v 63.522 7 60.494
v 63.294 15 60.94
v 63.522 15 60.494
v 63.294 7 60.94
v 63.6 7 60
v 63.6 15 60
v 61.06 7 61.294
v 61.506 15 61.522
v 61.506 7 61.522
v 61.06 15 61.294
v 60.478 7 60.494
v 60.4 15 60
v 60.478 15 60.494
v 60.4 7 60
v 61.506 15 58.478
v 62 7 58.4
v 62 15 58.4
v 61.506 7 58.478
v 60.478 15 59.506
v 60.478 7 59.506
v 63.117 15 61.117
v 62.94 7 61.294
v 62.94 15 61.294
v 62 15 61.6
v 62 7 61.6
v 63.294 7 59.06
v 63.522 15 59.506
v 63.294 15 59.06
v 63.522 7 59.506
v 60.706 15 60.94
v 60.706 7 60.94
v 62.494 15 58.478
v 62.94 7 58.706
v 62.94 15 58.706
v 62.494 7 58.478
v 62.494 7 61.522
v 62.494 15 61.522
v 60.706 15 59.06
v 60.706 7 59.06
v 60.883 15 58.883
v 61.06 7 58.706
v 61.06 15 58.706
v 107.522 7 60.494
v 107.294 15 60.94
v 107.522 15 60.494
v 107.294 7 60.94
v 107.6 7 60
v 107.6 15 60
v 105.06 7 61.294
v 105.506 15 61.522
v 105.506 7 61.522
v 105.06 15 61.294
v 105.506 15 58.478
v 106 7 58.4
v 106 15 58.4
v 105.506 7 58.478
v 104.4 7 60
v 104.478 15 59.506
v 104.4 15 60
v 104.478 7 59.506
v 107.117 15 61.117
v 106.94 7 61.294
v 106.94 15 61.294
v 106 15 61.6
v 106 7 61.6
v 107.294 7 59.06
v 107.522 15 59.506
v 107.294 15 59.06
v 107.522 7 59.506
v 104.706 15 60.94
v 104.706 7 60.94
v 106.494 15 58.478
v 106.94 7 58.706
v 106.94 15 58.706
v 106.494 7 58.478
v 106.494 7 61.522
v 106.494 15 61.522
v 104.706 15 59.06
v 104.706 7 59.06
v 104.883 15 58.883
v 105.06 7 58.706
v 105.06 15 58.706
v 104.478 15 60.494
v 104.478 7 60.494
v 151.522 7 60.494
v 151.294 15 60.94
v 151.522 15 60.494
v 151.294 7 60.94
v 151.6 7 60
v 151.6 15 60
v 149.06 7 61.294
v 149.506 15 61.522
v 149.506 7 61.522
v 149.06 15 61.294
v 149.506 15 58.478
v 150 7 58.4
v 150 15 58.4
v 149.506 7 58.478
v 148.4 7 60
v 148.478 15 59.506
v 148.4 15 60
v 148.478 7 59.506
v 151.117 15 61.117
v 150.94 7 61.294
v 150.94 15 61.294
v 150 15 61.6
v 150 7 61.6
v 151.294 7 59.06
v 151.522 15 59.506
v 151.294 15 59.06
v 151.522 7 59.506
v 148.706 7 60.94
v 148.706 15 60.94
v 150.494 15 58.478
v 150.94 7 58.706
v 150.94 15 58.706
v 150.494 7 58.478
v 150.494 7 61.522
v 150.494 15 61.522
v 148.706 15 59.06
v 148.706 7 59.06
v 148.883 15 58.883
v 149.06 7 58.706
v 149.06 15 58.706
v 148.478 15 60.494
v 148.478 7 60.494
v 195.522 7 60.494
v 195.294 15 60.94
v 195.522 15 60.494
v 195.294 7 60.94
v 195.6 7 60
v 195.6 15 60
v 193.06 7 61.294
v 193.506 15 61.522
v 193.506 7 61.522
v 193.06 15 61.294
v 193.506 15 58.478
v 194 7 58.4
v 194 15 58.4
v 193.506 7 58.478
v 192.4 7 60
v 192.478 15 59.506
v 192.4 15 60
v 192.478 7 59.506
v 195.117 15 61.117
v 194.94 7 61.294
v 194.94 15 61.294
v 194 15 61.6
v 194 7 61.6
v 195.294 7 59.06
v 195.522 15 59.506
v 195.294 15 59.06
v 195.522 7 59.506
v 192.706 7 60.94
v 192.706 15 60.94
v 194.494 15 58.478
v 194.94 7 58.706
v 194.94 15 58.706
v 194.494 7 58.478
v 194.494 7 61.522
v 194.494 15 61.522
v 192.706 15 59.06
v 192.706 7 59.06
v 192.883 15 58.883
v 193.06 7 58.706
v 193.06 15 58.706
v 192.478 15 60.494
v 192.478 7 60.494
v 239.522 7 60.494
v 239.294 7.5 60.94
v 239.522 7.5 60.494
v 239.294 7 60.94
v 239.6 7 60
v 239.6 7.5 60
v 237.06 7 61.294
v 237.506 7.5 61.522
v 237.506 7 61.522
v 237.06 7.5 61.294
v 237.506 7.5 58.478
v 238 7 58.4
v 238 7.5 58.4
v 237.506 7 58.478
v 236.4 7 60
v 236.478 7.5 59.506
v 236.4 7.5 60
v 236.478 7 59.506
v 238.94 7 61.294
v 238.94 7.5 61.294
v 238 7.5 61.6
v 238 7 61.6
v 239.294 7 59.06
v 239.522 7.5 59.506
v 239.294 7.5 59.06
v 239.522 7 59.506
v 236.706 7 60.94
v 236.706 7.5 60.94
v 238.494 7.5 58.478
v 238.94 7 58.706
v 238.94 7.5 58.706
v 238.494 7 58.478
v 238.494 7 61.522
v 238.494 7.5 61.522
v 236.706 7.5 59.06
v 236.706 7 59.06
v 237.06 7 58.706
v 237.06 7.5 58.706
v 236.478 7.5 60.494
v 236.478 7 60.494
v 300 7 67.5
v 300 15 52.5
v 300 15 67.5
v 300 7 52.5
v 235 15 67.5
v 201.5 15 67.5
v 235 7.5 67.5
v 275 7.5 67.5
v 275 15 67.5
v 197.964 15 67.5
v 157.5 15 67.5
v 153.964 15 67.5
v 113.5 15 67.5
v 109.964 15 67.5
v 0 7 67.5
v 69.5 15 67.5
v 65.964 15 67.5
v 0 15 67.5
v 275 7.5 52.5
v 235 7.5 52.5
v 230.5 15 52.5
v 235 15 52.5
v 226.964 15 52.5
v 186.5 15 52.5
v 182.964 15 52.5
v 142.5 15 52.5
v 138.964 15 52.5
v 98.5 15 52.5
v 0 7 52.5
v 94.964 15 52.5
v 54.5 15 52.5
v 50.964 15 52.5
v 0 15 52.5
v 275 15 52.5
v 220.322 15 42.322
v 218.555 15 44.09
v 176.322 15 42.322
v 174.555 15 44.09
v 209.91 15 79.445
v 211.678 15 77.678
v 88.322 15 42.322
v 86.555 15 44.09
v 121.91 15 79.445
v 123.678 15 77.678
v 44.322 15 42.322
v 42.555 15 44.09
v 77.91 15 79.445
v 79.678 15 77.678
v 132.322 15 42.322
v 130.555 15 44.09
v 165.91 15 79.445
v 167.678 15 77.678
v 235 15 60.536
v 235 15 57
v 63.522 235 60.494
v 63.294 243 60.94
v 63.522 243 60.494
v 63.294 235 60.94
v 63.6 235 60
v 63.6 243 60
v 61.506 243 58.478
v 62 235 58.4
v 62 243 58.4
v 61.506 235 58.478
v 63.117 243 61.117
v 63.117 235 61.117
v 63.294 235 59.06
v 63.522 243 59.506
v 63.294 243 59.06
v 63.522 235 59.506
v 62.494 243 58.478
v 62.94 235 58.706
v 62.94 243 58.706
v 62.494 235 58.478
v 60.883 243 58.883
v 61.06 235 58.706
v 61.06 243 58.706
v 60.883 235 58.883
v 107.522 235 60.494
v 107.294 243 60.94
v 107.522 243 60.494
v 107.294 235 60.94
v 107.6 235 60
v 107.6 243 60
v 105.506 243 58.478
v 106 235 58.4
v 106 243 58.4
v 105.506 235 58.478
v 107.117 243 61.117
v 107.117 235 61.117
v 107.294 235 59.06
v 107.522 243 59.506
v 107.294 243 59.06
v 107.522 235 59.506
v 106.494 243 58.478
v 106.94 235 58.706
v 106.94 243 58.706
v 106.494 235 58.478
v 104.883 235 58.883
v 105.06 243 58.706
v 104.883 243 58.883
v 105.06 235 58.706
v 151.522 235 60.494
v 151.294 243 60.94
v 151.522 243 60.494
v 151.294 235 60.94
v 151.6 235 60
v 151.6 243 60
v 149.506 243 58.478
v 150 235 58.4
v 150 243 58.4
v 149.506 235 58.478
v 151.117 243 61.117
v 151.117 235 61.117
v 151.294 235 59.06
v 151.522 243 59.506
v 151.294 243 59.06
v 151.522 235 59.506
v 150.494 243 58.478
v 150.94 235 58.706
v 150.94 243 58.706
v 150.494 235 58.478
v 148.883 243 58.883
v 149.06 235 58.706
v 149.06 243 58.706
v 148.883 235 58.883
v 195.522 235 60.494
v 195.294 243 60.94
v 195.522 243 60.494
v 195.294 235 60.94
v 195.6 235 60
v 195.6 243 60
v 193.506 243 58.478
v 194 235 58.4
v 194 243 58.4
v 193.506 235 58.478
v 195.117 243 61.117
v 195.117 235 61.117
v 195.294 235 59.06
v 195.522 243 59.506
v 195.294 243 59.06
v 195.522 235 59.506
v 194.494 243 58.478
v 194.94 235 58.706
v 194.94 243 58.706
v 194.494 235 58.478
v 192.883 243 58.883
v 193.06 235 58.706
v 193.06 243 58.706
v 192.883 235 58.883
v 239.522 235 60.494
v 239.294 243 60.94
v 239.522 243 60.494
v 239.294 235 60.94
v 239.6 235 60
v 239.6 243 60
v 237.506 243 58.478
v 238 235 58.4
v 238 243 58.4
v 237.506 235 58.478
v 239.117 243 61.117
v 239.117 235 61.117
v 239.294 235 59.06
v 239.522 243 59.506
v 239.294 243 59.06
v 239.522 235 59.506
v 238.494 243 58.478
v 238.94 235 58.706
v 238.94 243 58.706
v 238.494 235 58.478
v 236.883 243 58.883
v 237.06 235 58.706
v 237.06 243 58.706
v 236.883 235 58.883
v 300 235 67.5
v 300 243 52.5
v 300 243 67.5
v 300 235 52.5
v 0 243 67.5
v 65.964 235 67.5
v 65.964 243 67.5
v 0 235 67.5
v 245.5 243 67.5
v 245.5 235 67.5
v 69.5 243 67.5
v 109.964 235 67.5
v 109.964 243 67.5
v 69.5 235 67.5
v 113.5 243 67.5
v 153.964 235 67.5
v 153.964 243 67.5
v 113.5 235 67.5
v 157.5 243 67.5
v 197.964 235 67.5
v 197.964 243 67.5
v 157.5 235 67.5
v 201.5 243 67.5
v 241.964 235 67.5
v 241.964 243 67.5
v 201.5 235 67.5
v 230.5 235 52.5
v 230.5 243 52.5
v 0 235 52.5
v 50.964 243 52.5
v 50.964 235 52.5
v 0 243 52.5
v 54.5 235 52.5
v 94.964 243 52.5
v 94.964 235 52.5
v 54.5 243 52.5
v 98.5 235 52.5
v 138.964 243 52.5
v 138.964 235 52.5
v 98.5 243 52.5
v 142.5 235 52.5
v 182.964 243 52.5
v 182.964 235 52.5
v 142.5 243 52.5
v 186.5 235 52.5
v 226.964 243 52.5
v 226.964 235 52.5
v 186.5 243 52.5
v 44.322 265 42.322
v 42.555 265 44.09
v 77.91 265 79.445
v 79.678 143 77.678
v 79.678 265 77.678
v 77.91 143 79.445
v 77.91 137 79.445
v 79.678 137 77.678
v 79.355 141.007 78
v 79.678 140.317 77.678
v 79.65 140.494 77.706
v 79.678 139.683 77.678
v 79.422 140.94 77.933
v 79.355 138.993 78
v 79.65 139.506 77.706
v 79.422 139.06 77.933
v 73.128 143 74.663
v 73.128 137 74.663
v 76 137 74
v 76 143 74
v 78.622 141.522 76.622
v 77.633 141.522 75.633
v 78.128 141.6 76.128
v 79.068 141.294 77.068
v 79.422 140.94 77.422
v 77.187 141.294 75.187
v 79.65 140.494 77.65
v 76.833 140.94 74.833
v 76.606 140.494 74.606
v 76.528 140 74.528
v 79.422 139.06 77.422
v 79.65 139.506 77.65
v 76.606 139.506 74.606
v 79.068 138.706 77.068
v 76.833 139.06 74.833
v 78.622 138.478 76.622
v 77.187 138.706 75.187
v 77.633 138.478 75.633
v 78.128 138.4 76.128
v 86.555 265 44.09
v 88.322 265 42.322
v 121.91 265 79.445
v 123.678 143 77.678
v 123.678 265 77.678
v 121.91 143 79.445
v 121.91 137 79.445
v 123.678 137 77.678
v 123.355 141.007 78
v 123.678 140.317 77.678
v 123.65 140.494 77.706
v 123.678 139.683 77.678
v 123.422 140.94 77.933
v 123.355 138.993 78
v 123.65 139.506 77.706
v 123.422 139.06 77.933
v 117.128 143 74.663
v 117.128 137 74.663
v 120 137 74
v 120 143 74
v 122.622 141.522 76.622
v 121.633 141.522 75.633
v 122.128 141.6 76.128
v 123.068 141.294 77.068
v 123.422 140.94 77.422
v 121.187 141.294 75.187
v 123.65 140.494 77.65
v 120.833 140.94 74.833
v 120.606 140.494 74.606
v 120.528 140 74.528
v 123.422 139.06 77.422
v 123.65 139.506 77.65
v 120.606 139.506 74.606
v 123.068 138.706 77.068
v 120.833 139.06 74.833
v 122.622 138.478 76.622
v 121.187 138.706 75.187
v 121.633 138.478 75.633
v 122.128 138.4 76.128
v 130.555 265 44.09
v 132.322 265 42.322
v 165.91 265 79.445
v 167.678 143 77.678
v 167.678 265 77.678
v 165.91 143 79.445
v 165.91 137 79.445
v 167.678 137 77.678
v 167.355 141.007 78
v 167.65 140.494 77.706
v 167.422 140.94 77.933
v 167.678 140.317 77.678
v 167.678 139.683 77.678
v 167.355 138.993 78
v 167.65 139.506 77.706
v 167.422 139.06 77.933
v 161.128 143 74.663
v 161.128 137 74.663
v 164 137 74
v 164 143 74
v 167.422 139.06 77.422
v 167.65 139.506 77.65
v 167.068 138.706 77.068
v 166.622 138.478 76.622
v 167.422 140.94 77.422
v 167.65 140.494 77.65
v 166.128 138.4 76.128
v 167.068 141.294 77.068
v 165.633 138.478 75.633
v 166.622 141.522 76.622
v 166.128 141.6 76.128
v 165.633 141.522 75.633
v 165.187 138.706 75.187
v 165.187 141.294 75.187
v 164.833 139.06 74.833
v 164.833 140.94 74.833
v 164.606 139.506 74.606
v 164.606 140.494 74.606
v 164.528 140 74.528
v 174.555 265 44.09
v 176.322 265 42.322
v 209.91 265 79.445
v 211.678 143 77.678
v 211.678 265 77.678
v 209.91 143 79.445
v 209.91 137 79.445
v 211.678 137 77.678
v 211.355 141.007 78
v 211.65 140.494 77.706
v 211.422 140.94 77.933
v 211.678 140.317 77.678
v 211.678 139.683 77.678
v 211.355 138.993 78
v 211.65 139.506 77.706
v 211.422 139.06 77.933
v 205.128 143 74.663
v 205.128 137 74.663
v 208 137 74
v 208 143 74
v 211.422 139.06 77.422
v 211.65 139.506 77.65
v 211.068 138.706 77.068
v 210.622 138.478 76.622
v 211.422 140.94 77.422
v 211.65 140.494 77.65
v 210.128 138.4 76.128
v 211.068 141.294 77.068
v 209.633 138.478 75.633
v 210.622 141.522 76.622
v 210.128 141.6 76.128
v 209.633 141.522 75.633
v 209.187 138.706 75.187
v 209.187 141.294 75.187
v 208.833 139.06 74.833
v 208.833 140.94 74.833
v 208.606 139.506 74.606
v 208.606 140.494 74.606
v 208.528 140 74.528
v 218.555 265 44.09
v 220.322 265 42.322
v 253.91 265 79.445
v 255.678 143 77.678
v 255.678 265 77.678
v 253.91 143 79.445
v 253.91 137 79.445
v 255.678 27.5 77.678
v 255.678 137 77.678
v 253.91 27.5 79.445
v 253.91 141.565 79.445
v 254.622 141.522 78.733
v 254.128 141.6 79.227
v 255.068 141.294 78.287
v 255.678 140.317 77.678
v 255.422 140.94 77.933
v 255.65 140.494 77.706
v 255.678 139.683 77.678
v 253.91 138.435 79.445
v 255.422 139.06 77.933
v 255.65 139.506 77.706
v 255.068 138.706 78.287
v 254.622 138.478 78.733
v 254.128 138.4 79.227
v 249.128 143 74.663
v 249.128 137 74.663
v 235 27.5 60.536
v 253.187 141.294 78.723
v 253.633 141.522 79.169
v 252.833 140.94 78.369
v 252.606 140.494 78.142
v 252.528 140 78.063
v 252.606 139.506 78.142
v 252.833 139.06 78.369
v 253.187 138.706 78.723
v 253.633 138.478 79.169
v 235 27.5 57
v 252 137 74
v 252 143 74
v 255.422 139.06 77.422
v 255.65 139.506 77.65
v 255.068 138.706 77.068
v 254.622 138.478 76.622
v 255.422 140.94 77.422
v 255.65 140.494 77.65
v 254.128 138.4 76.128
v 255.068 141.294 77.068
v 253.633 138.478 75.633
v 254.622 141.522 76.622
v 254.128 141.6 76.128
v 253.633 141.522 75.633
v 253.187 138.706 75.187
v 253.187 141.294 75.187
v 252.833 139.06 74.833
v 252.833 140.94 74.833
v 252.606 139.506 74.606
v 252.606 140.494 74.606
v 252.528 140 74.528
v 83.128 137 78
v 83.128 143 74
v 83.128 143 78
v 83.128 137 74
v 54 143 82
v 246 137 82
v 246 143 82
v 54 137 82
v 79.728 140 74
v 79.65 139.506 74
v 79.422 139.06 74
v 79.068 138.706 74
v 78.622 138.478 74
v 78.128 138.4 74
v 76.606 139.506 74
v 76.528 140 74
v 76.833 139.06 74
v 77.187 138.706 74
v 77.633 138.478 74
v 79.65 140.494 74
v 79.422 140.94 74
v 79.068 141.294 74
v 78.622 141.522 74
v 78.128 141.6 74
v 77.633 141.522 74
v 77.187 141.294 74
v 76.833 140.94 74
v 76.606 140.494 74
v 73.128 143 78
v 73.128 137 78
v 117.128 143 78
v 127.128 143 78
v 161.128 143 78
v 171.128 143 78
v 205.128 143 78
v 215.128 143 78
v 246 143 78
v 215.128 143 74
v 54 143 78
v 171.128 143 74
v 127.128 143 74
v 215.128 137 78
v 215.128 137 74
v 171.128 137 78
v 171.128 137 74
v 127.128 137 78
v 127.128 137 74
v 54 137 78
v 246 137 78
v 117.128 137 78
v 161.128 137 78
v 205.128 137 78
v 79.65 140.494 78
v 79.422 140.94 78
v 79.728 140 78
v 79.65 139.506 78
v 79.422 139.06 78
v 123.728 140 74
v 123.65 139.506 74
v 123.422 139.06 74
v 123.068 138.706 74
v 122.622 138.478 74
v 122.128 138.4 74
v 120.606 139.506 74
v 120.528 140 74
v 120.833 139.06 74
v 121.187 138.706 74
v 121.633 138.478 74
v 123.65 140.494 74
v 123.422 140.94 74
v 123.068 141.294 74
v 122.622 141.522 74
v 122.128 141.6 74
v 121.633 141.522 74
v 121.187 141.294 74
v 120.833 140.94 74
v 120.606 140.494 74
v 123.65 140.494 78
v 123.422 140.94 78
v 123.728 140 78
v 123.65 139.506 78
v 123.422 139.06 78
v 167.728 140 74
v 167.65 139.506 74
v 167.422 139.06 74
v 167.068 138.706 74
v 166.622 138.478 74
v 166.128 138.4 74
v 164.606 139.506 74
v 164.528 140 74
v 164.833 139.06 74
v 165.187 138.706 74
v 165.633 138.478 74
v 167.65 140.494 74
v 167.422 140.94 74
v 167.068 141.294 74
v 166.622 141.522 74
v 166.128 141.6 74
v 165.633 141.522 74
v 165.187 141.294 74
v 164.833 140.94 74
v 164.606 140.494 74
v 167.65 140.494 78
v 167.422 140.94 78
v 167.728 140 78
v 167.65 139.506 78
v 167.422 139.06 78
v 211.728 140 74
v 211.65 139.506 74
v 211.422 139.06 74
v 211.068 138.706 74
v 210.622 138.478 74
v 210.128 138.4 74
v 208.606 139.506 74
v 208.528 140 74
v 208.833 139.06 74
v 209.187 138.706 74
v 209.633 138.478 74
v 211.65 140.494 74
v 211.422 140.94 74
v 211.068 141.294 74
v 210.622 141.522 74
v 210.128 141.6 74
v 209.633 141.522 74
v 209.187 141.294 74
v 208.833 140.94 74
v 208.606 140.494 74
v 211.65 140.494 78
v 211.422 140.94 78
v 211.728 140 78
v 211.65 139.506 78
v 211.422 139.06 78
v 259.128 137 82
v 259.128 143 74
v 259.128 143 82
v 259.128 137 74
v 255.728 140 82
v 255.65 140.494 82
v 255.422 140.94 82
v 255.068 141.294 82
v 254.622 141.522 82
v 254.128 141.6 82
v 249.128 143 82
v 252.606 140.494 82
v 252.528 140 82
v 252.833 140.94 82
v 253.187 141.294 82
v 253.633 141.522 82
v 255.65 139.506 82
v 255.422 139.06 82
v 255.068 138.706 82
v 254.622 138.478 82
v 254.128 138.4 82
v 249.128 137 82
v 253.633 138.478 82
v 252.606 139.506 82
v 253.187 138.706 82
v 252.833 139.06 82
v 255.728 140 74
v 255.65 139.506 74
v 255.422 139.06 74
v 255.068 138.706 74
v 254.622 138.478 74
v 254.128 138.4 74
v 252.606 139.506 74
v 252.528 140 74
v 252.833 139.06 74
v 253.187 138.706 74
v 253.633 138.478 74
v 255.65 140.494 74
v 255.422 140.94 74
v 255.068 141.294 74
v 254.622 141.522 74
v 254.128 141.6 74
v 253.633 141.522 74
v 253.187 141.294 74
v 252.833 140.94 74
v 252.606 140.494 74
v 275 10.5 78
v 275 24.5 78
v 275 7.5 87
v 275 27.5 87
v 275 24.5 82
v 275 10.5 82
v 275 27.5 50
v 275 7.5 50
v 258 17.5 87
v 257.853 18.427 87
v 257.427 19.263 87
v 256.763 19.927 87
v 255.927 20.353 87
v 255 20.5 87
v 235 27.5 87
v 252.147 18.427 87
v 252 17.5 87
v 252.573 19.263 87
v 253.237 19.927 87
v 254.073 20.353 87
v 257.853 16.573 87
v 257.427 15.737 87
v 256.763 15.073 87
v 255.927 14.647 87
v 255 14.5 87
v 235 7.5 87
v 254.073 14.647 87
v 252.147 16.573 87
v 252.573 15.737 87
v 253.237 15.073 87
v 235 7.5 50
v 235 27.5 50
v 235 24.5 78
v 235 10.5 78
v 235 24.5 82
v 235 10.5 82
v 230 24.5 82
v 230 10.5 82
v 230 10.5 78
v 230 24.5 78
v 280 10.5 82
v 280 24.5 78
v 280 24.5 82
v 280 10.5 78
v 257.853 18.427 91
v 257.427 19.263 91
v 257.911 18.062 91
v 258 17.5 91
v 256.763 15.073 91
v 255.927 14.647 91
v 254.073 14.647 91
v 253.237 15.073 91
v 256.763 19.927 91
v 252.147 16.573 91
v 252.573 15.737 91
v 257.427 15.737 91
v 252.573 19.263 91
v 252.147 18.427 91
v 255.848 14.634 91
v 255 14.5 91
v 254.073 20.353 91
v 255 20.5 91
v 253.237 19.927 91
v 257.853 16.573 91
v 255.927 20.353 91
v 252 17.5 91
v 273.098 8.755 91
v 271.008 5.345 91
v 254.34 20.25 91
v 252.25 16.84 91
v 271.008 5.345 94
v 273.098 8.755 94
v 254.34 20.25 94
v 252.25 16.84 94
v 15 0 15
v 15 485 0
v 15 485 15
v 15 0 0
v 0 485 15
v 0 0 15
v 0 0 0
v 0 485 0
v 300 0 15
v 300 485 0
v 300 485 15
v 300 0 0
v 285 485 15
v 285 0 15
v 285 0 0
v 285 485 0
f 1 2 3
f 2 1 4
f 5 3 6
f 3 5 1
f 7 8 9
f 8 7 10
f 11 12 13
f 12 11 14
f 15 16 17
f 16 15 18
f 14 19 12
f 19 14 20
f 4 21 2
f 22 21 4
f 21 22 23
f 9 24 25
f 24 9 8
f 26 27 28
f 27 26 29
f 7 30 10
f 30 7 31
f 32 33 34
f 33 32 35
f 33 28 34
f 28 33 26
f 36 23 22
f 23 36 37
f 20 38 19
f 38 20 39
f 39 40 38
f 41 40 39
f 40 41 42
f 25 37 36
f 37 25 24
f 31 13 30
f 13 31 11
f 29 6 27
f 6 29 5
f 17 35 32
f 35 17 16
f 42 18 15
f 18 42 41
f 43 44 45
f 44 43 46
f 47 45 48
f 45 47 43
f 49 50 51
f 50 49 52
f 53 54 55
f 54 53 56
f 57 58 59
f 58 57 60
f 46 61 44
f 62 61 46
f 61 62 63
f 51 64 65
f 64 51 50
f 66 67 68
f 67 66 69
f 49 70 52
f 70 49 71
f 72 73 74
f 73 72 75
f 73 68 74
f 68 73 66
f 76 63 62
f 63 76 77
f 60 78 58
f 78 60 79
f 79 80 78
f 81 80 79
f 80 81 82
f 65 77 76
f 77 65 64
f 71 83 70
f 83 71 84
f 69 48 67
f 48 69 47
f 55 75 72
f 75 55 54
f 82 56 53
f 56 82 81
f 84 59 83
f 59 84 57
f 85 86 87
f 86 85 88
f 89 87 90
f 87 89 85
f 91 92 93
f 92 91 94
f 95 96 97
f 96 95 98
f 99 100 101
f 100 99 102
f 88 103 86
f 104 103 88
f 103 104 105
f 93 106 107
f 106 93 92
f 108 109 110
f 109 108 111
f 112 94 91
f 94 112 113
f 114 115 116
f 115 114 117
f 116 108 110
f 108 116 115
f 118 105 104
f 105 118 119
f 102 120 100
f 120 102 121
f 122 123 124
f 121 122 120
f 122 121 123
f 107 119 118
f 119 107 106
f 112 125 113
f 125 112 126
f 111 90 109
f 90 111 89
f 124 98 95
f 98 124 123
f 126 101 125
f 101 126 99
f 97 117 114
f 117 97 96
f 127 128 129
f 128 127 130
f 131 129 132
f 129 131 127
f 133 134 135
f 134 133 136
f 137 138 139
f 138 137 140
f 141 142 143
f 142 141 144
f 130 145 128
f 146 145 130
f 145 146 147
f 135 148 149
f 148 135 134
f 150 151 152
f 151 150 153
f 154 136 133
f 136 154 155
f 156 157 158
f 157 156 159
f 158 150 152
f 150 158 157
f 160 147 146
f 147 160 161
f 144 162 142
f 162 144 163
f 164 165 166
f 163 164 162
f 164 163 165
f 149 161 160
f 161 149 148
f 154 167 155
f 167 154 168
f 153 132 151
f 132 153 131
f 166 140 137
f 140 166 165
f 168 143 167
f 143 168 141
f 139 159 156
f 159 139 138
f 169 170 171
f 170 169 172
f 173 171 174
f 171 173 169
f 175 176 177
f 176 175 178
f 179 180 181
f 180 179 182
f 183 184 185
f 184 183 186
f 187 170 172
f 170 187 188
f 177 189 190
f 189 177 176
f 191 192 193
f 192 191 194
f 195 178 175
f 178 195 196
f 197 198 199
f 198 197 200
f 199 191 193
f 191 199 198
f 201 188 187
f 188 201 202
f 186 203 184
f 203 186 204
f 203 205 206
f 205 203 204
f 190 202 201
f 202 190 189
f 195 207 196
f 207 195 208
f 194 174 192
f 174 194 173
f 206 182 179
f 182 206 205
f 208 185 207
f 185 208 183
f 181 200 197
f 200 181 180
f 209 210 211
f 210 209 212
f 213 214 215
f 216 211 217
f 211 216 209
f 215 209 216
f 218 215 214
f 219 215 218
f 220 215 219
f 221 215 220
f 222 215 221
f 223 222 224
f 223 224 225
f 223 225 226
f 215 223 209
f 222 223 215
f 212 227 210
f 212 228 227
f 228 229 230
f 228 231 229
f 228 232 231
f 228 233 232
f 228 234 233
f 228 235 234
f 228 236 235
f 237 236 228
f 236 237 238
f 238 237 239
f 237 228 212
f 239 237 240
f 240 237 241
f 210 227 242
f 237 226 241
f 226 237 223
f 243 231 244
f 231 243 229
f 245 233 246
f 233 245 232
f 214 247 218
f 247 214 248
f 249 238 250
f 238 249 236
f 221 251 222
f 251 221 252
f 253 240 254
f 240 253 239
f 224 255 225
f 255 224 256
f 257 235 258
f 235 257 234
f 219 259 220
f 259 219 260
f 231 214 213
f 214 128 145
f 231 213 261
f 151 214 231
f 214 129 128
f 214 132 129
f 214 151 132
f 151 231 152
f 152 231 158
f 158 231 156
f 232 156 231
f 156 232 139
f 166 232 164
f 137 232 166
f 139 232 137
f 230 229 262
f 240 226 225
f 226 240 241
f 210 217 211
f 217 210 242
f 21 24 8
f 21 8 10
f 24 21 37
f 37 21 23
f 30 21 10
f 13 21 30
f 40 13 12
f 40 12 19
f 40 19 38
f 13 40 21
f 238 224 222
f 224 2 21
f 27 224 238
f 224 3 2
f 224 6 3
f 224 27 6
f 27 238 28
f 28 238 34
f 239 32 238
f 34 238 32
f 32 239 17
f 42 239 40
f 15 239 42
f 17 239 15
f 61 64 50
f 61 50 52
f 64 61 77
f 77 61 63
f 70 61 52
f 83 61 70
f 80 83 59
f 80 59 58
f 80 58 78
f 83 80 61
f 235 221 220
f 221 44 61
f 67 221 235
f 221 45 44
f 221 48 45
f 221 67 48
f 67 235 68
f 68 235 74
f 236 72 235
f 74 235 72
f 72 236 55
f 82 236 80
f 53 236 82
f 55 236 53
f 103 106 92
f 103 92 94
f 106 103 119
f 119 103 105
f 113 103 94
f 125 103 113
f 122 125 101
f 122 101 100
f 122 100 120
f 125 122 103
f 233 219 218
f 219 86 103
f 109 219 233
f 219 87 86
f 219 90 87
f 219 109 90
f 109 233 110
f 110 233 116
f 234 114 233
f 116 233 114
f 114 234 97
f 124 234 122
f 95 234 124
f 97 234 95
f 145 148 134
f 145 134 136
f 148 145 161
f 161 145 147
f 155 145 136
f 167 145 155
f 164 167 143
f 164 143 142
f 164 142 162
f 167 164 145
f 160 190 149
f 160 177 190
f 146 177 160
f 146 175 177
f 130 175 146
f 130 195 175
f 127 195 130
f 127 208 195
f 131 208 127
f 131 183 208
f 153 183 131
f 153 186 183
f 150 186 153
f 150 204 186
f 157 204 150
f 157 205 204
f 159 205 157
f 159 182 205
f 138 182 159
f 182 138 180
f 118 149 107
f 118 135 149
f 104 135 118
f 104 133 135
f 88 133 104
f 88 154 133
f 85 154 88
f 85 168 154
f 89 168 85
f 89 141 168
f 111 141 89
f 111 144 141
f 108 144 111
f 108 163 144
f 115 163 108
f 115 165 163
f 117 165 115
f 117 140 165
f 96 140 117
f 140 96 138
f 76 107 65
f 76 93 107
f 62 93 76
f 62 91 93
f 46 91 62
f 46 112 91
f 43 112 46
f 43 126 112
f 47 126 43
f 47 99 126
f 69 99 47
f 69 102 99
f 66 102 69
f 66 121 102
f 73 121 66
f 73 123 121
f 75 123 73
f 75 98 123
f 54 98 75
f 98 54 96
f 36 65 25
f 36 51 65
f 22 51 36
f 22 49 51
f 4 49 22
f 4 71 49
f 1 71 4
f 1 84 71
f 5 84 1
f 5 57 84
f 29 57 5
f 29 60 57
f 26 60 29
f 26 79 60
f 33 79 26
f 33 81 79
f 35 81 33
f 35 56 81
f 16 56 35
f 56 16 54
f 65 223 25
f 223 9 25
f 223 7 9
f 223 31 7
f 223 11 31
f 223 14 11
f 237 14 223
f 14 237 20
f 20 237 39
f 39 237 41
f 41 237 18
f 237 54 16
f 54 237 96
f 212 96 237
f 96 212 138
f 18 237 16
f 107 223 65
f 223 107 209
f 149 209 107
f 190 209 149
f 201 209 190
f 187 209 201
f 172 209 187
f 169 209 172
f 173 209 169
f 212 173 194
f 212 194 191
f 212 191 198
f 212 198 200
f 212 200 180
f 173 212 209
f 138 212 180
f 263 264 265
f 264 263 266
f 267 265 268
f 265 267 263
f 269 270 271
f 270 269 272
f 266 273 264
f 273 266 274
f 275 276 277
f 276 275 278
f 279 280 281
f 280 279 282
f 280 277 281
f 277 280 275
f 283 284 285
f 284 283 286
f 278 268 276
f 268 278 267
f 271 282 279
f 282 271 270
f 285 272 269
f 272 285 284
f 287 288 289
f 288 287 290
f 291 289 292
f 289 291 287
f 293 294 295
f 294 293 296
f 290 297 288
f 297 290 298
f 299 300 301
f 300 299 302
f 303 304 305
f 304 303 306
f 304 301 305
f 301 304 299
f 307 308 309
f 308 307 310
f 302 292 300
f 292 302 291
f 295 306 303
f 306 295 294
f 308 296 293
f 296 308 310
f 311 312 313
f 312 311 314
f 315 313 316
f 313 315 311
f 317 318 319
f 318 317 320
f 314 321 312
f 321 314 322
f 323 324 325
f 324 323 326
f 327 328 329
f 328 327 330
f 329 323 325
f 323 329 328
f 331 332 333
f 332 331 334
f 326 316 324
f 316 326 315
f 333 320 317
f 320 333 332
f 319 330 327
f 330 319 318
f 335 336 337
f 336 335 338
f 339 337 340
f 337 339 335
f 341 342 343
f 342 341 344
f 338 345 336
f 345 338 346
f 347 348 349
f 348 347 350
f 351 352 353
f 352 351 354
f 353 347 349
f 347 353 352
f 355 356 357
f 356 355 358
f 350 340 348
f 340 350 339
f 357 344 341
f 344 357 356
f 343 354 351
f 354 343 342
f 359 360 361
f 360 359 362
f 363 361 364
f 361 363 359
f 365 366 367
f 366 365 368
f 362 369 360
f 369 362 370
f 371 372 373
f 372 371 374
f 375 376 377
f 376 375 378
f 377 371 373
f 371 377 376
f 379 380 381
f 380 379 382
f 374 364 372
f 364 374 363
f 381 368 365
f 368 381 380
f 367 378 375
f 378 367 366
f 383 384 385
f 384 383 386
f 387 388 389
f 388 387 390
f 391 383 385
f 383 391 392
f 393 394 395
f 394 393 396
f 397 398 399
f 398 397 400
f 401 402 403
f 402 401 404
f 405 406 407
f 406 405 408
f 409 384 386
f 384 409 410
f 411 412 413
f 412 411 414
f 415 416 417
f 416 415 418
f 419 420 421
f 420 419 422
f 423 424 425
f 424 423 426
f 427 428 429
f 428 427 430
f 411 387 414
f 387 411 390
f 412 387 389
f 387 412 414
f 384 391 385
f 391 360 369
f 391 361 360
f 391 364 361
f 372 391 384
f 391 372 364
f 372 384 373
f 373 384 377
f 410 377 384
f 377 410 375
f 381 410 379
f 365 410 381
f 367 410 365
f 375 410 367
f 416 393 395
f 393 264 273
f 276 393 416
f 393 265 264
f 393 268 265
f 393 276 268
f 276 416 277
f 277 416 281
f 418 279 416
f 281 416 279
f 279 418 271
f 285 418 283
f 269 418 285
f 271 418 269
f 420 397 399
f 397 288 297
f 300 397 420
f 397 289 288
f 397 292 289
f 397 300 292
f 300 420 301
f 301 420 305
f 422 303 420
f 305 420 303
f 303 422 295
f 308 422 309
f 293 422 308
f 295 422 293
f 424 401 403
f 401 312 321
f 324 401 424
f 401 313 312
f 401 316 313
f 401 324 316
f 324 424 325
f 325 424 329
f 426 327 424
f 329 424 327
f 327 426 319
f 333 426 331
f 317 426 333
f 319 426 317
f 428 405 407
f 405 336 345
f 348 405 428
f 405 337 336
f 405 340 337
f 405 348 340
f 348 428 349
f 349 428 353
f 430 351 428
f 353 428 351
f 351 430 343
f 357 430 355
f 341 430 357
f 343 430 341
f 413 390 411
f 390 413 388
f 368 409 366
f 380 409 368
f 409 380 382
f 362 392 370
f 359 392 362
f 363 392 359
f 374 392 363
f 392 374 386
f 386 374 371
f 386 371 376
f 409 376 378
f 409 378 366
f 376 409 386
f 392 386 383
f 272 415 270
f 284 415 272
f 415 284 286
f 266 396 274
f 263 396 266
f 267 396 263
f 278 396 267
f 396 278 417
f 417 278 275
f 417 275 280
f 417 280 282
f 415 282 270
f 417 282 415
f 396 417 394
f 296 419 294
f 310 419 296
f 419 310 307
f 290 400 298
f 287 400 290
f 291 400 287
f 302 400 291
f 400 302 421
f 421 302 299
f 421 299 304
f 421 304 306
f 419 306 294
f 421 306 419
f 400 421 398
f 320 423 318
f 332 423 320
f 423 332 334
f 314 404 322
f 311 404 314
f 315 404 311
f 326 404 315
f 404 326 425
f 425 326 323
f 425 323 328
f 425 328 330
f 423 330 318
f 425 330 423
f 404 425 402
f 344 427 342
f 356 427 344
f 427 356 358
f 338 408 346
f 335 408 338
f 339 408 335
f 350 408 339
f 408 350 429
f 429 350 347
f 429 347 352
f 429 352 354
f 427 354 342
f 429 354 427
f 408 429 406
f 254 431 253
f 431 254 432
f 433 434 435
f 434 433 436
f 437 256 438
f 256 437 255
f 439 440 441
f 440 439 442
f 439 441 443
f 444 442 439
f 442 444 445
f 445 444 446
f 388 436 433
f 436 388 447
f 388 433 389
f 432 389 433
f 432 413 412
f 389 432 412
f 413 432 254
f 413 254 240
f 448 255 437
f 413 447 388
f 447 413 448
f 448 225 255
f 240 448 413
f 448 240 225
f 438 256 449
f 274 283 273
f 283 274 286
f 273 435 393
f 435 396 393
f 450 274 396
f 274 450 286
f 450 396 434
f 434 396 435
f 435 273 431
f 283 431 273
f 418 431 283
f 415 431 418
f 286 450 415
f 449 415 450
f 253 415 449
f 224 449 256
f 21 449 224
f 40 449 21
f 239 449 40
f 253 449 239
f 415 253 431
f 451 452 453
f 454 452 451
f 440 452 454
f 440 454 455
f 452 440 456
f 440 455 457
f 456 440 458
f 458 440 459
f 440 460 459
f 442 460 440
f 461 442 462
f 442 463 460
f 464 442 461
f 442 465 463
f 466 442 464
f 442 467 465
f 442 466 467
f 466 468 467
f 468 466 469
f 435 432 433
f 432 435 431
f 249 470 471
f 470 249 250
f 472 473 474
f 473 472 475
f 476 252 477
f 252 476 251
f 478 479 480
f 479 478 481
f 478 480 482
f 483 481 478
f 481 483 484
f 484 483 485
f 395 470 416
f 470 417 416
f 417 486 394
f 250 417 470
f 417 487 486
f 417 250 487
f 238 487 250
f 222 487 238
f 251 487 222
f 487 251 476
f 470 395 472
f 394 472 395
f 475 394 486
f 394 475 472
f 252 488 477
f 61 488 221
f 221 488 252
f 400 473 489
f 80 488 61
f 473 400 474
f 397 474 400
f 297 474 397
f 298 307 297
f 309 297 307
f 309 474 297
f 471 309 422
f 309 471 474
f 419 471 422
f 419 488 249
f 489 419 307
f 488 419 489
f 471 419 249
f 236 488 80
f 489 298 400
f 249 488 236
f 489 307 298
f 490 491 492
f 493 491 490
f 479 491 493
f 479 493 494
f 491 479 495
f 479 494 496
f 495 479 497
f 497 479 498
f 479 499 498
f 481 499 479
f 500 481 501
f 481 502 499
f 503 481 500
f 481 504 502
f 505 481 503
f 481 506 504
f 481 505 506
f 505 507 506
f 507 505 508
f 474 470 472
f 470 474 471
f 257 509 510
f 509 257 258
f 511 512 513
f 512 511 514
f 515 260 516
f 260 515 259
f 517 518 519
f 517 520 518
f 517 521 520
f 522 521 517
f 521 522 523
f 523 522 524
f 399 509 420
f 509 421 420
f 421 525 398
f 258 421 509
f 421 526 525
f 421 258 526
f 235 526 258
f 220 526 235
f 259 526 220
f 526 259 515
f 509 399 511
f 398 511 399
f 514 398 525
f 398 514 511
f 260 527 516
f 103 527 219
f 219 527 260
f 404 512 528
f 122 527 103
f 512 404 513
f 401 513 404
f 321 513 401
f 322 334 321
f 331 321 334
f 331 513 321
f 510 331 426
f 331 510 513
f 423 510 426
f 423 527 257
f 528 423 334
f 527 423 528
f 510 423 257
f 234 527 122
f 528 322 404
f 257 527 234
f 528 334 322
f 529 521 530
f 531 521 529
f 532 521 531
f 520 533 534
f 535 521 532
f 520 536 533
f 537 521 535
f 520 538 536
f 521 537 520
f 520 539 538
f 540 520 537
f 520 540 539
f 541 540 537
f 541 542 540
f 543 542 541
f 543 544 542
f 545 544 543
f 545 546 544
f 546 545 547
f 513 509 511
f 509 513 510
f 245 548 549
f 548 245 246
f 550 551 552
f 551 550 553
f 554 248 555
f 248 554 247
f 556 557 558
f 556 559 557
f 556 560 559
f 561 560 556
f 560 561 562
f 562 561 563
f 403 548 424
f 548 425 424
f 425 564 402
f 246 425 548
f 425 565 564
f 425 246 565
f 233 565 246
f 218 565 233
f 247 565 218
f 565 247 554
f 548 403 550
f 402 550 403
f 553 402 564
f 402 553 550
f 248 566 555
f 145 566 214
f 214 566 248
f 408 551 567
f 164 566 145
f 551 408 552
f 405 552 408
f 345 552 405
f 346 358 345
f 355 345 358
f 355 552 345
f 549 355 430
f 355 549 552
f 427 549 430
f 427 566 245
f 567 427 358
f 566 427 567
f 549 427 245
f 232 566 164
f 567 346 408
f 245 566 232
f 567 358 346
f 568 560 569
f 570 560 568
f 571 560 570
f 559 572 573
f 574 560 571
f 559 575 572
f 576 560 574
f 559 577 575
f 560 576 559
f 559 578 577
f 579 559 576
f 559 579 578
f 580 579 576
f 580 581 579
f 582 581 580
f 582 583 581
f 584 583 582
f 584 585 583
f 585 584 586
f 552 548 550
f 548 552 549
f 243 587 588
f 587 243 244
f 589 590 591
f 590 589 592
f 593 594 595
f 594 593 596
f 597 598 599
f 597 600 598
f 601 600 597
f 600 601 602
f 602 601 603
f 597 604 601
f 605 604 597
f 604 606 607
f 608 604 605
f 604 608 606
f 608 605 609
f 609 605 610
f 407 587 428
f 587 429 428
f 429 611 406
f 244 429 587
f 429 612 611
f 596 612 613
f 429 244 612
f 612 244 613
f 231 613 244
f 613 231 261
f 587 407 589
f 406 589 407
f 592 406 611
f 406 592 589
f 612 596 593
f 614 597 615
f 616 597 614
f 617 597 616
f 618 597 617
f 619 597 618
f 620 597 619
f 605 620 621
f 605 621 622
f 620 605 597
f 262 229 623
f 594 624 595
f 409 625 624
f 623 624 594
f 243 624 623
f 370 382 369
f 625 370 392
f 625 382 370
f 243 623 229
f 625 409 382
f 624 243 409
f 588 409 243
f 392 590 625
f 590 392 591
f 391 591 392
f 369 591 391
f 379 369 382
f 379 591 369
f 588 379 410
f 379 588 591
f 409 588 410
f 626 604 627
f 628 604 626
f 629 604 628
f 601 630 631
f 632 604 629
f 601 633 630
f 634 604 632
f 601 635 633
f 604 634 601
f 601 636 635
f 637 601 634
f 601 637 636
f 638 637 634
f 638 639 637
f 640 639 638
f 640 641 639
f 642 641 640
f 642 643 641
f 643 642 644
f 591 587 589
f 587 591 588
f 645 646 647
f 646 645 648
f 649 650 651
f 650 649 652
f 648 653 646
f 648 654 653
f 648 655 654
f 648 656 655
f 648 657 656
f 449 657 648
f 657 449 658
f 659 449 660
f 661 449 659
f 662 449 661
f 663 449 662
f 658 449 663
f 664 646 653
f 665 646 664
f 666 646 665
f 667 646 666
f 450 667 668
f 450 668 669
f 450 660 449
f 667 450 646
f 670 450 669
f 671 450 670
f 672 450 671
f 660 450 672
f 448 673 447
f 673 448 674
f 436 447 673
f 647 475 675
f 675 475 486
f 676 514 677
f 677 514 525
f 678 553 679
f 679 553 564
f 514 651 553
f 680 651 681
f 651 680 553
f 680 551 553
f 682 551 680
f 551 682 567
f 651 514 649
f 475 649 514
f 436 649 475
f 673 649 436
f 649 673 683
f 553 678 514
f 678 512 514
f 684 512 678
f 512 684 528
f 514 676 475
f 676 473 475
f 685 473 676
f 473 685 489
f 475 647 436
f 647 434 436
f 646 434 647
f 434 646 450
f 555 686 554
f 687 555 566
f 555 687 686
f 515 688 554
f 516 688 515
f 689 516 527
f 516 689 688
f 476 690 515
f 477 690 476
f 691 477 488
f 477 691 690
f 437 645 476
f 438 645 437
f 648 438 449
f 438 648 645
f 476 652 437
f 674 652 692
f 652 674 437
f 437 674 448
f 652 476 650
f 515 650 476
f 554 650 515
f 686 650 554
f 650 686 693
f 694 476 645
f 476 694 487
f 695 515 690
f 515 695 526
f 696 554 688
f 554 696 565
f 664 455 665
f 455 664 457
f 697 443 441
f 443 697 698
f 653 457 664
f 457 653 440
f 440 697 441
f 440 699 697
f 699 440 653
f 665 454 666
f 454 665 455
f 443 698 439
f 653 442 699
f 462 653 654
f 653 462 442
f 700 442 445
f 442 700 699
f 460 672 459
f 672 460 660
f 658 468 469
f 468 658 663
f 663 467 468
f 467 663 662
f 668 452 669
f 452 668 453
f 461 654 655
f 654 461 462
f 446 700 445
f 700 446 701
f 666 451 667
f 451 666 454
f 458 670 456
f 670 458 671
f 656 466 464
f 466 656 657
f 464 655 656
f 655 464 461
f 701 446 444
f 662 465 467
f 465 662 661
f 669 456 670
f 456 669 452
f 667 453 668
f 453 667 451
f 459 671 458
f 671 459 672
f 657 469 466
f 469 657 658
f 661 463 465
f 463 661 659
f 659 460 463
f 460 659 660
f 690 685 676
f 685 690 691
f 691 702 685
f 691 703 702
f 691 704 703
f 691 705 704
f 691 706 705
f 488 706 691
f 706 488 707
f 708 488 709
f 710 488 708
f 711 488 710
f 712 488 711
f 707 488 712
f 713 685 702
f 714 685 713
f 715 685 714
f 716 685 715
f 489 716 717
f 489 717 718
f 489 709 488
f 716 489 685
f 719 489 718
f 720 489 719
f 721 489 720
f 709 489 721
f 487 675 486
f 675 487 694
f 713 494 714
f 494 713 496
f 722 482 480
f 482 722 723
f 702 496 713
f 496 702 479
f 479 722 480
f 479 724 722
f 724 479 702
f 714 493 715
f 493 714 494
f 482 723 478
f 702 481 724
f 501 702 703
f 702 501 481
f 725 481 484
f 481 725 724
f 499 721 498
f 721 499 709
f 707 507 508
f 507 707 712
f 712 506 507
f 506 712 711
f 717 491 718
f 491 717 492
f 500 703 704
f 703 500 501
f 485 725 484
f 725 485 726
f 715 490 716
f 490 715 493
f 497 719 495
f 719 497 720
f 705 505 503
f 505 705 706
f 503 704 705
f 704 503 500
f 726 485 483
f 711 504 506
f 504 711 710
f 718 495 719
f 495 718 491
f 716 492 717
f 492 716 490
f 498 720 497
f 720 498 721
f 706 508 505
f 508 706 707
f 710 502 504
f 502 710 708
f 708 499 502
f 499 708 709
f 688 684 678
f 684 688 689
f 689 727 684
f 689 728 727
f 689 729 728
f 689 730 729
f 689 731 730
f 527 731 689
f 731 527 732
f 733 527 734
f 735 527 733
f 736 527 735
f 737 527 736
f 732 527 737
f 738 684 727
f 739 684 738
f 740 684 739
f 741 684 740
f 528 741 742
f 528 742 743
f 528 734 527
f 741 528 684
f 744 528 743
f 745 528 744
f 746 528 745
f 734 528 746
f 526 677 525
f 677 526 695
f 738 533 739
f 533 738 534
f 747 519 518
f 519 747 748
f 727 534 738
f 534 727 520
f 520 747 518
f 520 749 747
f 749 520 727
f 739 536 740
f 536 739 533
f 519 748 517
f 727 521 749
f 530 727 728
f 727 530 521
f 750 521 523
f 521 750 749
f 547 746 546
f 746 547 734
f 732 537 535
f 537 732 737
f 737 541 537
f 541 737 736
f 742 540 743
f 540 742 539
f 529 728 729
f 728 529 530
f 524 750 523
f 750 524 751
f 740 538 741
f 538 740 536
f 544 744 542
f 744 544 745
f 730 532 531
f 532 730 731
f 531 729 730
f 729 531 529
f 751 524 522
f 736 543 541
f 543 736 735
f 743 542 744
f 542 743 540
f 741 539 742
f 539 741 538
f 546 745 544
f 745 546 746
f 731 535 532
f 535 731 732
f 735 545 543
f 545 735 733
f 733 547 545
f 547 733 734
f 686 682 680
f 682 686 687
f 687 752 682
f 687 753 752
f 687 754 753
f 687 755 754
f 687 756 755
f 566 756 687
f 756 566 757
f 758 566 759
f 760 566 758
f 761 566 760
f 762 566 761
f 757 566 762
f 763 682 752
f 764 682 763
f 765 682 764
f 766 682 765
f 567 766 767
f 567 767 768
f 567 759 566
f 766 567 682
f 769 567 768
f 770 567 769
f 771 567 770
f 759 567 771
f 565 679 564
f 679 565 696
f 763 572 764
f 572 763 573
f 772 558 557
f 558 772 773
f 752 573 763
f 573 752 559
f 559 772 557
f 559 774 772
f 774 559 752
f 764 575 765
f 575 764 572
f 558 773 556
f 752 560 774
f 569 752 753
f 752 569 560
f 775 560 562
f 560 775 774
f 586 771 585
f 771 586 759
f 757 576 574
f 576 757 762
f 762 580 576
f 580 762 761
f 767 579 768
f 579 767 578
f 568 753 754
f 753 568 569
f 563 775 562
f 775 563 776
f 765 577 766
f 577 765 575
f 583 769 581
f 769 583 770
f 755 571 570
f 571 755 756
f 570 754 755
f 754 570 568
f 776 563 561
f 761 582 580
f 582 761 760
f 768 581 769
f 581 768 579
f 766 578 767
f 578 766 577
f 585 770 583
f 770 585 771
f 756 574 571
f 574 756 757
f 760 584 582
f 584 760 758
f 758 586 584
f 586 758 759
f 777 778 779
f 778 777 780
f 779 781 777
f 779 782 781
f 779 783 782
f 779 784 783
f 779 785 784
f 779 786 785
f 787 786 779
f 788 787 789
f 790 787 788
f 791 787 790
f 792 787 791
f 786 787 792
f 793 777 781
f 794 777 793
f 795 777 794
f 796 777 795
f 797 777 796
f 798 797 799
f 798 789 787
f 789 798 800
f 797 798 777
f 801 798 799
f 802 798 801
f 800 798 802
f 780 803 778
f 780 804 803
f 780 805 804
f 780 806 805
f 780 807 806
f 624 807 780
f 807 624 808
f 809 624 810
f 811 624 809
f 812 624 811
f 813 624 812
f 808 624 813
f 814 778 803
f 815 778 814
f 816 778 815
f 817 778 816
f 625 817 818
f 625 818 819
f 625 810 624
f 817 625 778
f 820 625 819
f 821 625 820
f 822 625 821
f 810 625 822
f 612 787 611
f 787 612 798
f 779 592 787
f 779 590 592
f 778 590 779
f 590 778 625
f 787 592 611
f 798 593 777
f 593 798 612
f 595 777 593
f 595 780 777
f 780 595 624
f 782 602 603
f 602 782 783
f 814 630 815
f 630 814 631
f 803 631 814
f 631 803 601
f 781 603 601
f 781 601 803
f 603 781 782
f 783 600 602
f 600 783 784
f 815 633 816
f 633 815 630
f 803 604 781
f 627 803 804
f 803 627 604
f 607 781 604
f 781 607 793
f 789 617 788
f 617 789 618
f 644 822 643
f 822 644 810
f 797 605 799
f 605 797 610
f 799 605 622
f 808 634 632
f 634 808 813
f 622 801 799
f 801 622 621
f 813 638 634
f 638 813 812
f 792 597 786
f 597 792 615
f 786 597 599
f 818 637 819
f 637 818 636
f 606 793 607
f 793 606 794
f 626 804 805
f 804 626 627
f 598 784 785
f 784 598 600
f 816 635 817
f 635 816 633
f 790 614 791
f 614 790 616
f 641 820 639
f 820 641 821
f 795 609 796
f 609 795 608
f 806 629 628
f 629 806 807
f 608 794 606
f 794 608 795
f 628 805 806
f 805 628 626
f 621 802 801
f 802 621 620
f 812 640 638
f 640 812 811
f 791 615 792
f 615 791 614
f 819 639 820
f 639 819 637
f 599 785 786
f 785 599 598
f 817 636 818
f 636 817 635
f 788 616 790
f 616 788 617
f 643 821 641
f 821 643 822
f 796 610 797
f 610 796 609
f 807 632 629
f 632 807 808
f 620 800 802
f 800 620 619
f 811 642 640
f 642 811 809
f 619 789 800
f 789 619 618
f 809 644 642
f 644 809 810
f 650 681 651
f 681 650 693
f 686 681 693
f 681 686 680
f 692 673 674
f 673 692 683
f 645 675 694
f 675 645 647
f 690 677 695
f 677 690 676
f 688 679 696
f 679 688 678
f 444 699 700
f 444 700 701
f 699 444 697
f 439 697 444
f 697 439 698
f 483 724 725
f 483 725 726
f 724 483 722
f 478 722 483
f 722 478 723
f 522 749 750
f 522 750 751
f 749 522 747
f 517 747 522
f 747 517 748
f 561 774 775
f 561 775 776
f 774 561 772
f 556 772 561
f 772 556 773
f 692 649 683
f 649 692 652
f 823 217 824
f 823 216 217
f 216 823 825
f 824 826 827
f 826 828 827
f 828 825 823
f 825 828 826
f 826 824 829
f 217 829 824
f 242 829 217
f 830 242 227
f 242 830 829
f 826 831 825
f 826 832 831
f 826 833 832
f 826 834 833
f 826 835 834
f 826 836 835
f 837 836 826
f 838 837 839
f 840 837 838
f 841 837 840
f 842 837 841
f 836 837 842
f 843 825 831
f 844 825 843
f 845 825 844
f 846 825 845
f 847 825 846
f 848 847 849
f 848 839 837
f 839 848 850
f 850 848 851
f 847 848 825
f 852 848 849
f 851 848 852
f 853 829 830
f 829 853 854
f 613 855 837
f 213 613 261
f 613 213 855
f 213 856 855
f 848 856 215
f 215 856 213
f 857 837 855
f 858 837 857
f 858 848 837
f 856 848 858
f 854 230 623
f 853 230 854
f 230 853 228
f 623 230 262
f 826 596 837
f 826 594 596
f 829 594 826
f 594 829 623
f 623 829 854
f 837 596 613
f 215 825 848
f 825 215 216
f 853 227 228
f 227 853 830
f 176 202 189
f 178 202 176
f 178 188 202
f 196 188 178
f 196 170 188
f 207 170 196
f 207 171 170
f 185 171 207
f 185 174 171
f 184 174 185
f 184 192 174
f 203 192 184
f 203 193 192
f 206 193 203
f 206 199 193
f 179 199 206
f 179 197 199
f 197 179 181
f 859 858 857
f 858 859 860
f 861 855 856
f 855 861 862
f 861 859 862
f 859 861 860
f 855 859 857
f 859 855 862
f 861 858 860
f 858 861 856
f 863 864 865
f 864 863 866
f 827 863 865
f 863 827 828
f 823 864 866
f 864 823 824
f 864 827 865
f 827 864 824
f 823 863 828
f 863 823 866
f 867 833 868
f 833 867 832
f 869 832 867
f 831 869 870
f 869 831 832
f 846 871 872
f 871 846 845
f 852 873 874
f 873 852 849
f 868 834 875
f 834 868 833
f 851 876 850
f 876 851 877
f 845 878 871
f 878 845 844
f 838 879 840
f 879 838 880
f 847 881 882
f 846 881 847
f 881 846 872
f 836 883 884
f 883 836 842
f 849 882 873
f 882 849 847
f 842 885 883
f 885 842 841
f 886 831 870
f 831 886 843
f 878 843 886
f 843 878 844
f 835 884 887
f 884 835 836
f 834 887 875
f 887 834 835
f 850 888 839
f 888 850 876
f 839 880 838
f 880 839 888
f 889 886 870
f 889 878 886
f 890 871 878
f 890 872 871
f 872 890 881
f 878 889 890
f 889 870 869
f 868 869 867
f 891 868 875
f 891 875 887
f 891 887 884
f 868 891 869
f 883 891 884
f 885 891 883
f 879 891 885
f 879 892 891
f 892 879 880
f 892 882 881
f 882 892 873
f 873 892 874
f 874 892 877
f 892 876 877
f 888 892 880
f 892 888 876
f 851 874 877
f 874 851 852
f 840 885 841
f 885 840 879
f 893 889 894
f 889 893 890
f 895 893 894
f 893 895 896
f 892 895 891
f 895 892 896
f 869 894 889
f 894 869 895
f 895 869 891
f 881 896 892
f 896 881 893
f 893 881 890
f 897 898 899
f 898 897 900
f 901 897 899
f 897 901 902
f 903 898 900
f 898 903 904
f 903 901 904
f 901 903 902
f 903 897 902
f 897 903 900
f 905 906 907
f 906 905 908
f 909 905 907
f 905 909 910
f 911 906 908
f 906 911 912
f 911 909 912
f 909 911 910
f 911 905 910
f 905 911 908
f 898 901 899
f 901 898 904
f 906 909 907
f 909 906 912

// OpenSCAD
// =====================================================================
//  MÔ HÌNH 3D: CƠ CẤU MÁI CHỚP CHE NẮNG TỰ ĐỘNG (LOUVER MECHANISM)
//  Dự án: Nhà Màng Thông Minh - ĐATN
//  Thông số: 5 tấm mái 5x25cm, Dầm giằng 30cm
//  Phần mềm: OpenSCAD (miễn phí)
// =====================================================================

// ─────────────────────────────────────────────────────────────────────
//  THÔNG SỐ TOÀN HỆ THỐNG (Chỉnh số ở đây, toàn bộ mô hình tự cập nhật)
// ─────────────────────────────────────────────────────────────────────

// --- Thông số tấm mái chớp ---
blade_length    = 250;  // mm - Chiều dài tấm lá chớp (chiều trước-sau)
blade_width     = 50;   // mm - Chiều rộng tấm lá chớp (chiều ngang che phủ)
blade_thick     = 2.5;  // mm - Độ dày tấm lá chớp (mica/nhựa PVC)
num_blades      = 5;    // Số lượng tấm lá chớp

// --- Thông số khoảng cách trục xoay ---
pitch           = 44;   // mm - Khoảng cách tâm-tâm giữa 2 trục xoay liên tiếp
arm_height      = 18;   // mm - Chiều cao tay đòn (Lỗ gốc -> Lỗ chốt thanh giằng)

// --- Thông số khung đỡ tĩnh ---
beam_length     = 300;  // mm - Chiều dài thanh dầm giằng (30cm)
beam_width      = 15;   // mm - Chiều ngang thanh dầm
beam_thick      = 8;    // mm - Độ dày thanh dầm
col_height      = 60;   // mm - Chiều cao 4 cột trụ đứng
col_w           = 15;   // mm - Chiều ngang mặt cắt cột trụ

// --- Thông số tai xoay / bản lề (Pivot Bracket) ---
bracket_h       = 22;   // mm - Chiều cao tai xoay (tính từ đáy lá chớp xuống)
bracket_w       = 10;   // mm - Chiều rộng tai xoay
bracket_thick   = 2;    // mm - Độ dày tai xoay
bolt_r          = 1.6;  // mm - Bán kính lỗ ốc M3 (đường kính 3.2mm, xoay trơn)

// --- Thông số thanh giằng di động (Linkage Rod) ---
link_thick      = 4;    // mm - Độ dày thanh giằng động
link_height     = 6;    // mm - Chiều cao mặt cắt thanh giằng

// --- Góc mở hiện tại (Thay đổi để xem mô hình ở trạng thái khác nhau) ---
// 0   = Đóng hoàn toàn (các lá nằm ngang che kín)
// 90  = Mở tối đa (các lá dựng đứng thông gió)
open_angle      = 45;   // <<< CHỈNH GIÁ TRỊ NÀY để xem các trạng thái khác nhau

// --- Màu sắc hiển thị ---
COLOR_FRAME     = [0.9, 0.9, 0.92, 1.0];   // Xám sáng - Khung & dầm
COLOR_BLADE     = [0.75, 0.92, 1.0, 0.85]; // Xanh nhạt trong - Tấm lá chớp (mica)
COLOR_BRACKET   = [0.6, 0.6, 0.6, 1.0];    // Xám tối - Tai xoay (kim loại)
COLOR_LINKAGE   = [0.85, 0.45, 0.1, 1.0];  // Cam - Thanh giằng động (nổi bật)
COLOR_SERVO     = [0.15, 0.45, 0.85, 1.0]; // Xanh dương - Khối Servo

// ─────────────────────────────────────────────────────────────────────
//  TÍNH TOÁN DẪN XUẤT (Tự động)
// ─────────────────────────────────────────────────────────────────────
total_span   = (num_blades - 1) * pitch;  // Tổng chiều dài vùng giàn mái chớp
margin       = (beam_length - total_span - blade_width) / 2; // Khoảng dư 2 đầu dầm
start_x      = margin + blade_width/2; // Tọa độ X của trục tấm lá đầu tiên

linkage_y_offset = arm_height; // Thanh giằng động nằm phía trên dầm tĩnh 1 đoạn arm_height
linkage_x_shift  = arm_height * sin(open_angle); // Độ dịch ngang tương ứng góc mở

// ─────────────────────────────────────────────────────────────────────
//  CÁC MODULE VẼ TỪNG KHỐI
// ─────────────────────────────────────────────────────────────────────

// --- Module: Thanh dầm tĩnh (ngang, có 5 lỗ) ---
module static_beam(xpos_list) {
    color(COLOR_FRAME)
    difference() {
        // Thân thanh dầm
        cube([beam_length, beam_thick, beam_width], center=false);
        // Khoét 5 lỗ ốc M3
        for (x = xpos_list) {
            translate([x, beam_thick/2, beam_width/2])
                rotate([90,0,0])
                    cylinder(r=bolt_r, h=beam_thick+2, center=true, $fn=20);
        }
    }
}

// --- Module: Cột trụ đứng góc ---
module corner_column(is_back) {
    color(COLOR_FRAME)
    difference() {
        cube([col_w, blade_length, col_w]);
        // Khe thông gió nhỏ trang trí (tuỳ chọn)
    }
}

// --- Module: Một tấm lá chớp (xoay theo góc mở) ---
module louver_blade(angle) {
    color(COLOR_BLADE)
    rotate([0, -angle, 0])  // Xoay quanh trục Y tại tâm chiều rộng
        translate([-blade_width/2, 0, 0])
            cube([blade_width, blade_length, blade_thick]);
}

// --- Module: Tai xoay / Bản lề (1 bên) ---
module pivot_bracket(angle) {
    color(COLOR_BRACKET)
    // Phần đứng của tai xoay
    cube([bracket_thick, blade_length * 0.12, bracket_h], center=false);
    // Phần ngang bắt vào tấm lá (xoay cùng lá chớp)
    translate([bracket_thick, 0, 0])
    rotate([0, -angle, 0])
        translate([0, 0, 0])
            cube([blade_thick + 1, blade_length * 0.12, bracket_w]);
}

// --- Module: Thanh giằng di động ---
module linkage_rod(xpos_list, x_shift) {
    color(COLOR_LINKAGE)
    // Thân thanh giằng
    translate([xpos_list[0] - 8, blade_length/2 - 3, 0])
        cube([xpos_list[num_blades-1] - xpos_list[0] + 16, link_height, link_thick]);
    // 5 lỗ ốc + tai bắt chốt
    for (x = xpos_list) {
        translate([x + x_shift - bolt_r, blade_length/2 - 3, -4])
            color(COLOR_BRACKET)
            difference() {
                cube([bracket_w, link_height, 8]);
                translate([bracket_w/2, link_height/2, -1])
                    cylinder(r=bolt_r, h=10, $fn=20);
            }
    }
}

// --- Module: Khối Servo MG996R (đơn giản hóa) ---
module servo_block() {
    color(COLOR_SERVO) {
        // Thân Servo
        cube([40, 20, 37]);
        // Tai bắt ốc 2 bên
        translate([-5, 3, 28])   cube([5, 14, 4]);
        translate([40, 3, 28])  cube([5, 14, 4]);
        // Trục Servo (nhô lên trên)
        translate([20, 10, 37])  cylinder(r=3, h=4, $fn=20);
    }
    // Cánh tay đòn Servo
    color([0.1,0.1,0.1])
    translate([20, 10, 41])
    rotate([0, 0, -(90 - open_angle)*0.7])  // Cánh tay quay tương ứng góc mở
        translate([-2, -2, 0])
            cube([arm_height + 4, 4, 3]);
}

// ─────────────────────────────────────────────────────────────────────
//  LẮP RÁP TOÀN BỘ CƠ CẤU (Assembly)
// ─────────────────────────────────────────────────────────────────────

// Tạo danh sách tọa độ X của từng trục xoay
x_positions = [for (i = [0:num_blades-1]) start_x + i * pitch];

// === KHỐI 1: KHUNG ĐỠ TĨNH ===

// 4 Cột trụ góc (2 trước, 2 sau)
translate([0, 0, 0])                          corner_column(false);
translate([beam_length - col_w, 0, 0])        corner_column(false);
translate([0, blade_length - col_w, 0])       corner_column(true);
translate([beam_length - col_w, blade_length - col_w, 0]) corner_column(true);

// Thanh dầm tĩnh PHÍA TRƯỚC (gắn trục xoay gốc)
translate([0, col_w - beam_thick, col_height - beam_width/2])
    static_beam(x_positions);

// Thanh dầm tĩnh PHÍA SAU (đối xứng)
translate([0, blade_length - col_w, col_height - beam_width/2])
    static_beam(x_positions);

// === KHỐI 2: 5 TẤM LÁ CHỚP (xoay theo open_angle) ===
for (i = [0:num_blades-1]) {
    x = x_positions[i];
    translate([x, col_w, col_height])
        louver_blade(open_angle);
}

// === KHỐI 3: THANH GIẰNG DI ĐỘNG (dịch chuyển theo open_angle) ===
translate([0, col_w, col_height + arm_height])
    linkage_rod(x_positions, linkage_x_shift);

// === KHỐI 4: SERVO MG996R ===
translate([beam_length - col_w - 50, col_w/2, col_height - 10])
    servo_block();

// ─────────────────────────────────────────────────────────────────────
//  CHÚ THÍCH KÍCH THƯỚC (Text 3D - chỉ hiển thị ở góc nhìn trên)
// ─────────────────────────────────────────────────────────────────────
// Bỏ comment dòng dưới nếu muốn hiển thị text kích thước:
// translate([10, -20, 0]) color("black") text("Dầm 300mm | 5 lá 50x250mm | Pitch 44mm", size=8);
